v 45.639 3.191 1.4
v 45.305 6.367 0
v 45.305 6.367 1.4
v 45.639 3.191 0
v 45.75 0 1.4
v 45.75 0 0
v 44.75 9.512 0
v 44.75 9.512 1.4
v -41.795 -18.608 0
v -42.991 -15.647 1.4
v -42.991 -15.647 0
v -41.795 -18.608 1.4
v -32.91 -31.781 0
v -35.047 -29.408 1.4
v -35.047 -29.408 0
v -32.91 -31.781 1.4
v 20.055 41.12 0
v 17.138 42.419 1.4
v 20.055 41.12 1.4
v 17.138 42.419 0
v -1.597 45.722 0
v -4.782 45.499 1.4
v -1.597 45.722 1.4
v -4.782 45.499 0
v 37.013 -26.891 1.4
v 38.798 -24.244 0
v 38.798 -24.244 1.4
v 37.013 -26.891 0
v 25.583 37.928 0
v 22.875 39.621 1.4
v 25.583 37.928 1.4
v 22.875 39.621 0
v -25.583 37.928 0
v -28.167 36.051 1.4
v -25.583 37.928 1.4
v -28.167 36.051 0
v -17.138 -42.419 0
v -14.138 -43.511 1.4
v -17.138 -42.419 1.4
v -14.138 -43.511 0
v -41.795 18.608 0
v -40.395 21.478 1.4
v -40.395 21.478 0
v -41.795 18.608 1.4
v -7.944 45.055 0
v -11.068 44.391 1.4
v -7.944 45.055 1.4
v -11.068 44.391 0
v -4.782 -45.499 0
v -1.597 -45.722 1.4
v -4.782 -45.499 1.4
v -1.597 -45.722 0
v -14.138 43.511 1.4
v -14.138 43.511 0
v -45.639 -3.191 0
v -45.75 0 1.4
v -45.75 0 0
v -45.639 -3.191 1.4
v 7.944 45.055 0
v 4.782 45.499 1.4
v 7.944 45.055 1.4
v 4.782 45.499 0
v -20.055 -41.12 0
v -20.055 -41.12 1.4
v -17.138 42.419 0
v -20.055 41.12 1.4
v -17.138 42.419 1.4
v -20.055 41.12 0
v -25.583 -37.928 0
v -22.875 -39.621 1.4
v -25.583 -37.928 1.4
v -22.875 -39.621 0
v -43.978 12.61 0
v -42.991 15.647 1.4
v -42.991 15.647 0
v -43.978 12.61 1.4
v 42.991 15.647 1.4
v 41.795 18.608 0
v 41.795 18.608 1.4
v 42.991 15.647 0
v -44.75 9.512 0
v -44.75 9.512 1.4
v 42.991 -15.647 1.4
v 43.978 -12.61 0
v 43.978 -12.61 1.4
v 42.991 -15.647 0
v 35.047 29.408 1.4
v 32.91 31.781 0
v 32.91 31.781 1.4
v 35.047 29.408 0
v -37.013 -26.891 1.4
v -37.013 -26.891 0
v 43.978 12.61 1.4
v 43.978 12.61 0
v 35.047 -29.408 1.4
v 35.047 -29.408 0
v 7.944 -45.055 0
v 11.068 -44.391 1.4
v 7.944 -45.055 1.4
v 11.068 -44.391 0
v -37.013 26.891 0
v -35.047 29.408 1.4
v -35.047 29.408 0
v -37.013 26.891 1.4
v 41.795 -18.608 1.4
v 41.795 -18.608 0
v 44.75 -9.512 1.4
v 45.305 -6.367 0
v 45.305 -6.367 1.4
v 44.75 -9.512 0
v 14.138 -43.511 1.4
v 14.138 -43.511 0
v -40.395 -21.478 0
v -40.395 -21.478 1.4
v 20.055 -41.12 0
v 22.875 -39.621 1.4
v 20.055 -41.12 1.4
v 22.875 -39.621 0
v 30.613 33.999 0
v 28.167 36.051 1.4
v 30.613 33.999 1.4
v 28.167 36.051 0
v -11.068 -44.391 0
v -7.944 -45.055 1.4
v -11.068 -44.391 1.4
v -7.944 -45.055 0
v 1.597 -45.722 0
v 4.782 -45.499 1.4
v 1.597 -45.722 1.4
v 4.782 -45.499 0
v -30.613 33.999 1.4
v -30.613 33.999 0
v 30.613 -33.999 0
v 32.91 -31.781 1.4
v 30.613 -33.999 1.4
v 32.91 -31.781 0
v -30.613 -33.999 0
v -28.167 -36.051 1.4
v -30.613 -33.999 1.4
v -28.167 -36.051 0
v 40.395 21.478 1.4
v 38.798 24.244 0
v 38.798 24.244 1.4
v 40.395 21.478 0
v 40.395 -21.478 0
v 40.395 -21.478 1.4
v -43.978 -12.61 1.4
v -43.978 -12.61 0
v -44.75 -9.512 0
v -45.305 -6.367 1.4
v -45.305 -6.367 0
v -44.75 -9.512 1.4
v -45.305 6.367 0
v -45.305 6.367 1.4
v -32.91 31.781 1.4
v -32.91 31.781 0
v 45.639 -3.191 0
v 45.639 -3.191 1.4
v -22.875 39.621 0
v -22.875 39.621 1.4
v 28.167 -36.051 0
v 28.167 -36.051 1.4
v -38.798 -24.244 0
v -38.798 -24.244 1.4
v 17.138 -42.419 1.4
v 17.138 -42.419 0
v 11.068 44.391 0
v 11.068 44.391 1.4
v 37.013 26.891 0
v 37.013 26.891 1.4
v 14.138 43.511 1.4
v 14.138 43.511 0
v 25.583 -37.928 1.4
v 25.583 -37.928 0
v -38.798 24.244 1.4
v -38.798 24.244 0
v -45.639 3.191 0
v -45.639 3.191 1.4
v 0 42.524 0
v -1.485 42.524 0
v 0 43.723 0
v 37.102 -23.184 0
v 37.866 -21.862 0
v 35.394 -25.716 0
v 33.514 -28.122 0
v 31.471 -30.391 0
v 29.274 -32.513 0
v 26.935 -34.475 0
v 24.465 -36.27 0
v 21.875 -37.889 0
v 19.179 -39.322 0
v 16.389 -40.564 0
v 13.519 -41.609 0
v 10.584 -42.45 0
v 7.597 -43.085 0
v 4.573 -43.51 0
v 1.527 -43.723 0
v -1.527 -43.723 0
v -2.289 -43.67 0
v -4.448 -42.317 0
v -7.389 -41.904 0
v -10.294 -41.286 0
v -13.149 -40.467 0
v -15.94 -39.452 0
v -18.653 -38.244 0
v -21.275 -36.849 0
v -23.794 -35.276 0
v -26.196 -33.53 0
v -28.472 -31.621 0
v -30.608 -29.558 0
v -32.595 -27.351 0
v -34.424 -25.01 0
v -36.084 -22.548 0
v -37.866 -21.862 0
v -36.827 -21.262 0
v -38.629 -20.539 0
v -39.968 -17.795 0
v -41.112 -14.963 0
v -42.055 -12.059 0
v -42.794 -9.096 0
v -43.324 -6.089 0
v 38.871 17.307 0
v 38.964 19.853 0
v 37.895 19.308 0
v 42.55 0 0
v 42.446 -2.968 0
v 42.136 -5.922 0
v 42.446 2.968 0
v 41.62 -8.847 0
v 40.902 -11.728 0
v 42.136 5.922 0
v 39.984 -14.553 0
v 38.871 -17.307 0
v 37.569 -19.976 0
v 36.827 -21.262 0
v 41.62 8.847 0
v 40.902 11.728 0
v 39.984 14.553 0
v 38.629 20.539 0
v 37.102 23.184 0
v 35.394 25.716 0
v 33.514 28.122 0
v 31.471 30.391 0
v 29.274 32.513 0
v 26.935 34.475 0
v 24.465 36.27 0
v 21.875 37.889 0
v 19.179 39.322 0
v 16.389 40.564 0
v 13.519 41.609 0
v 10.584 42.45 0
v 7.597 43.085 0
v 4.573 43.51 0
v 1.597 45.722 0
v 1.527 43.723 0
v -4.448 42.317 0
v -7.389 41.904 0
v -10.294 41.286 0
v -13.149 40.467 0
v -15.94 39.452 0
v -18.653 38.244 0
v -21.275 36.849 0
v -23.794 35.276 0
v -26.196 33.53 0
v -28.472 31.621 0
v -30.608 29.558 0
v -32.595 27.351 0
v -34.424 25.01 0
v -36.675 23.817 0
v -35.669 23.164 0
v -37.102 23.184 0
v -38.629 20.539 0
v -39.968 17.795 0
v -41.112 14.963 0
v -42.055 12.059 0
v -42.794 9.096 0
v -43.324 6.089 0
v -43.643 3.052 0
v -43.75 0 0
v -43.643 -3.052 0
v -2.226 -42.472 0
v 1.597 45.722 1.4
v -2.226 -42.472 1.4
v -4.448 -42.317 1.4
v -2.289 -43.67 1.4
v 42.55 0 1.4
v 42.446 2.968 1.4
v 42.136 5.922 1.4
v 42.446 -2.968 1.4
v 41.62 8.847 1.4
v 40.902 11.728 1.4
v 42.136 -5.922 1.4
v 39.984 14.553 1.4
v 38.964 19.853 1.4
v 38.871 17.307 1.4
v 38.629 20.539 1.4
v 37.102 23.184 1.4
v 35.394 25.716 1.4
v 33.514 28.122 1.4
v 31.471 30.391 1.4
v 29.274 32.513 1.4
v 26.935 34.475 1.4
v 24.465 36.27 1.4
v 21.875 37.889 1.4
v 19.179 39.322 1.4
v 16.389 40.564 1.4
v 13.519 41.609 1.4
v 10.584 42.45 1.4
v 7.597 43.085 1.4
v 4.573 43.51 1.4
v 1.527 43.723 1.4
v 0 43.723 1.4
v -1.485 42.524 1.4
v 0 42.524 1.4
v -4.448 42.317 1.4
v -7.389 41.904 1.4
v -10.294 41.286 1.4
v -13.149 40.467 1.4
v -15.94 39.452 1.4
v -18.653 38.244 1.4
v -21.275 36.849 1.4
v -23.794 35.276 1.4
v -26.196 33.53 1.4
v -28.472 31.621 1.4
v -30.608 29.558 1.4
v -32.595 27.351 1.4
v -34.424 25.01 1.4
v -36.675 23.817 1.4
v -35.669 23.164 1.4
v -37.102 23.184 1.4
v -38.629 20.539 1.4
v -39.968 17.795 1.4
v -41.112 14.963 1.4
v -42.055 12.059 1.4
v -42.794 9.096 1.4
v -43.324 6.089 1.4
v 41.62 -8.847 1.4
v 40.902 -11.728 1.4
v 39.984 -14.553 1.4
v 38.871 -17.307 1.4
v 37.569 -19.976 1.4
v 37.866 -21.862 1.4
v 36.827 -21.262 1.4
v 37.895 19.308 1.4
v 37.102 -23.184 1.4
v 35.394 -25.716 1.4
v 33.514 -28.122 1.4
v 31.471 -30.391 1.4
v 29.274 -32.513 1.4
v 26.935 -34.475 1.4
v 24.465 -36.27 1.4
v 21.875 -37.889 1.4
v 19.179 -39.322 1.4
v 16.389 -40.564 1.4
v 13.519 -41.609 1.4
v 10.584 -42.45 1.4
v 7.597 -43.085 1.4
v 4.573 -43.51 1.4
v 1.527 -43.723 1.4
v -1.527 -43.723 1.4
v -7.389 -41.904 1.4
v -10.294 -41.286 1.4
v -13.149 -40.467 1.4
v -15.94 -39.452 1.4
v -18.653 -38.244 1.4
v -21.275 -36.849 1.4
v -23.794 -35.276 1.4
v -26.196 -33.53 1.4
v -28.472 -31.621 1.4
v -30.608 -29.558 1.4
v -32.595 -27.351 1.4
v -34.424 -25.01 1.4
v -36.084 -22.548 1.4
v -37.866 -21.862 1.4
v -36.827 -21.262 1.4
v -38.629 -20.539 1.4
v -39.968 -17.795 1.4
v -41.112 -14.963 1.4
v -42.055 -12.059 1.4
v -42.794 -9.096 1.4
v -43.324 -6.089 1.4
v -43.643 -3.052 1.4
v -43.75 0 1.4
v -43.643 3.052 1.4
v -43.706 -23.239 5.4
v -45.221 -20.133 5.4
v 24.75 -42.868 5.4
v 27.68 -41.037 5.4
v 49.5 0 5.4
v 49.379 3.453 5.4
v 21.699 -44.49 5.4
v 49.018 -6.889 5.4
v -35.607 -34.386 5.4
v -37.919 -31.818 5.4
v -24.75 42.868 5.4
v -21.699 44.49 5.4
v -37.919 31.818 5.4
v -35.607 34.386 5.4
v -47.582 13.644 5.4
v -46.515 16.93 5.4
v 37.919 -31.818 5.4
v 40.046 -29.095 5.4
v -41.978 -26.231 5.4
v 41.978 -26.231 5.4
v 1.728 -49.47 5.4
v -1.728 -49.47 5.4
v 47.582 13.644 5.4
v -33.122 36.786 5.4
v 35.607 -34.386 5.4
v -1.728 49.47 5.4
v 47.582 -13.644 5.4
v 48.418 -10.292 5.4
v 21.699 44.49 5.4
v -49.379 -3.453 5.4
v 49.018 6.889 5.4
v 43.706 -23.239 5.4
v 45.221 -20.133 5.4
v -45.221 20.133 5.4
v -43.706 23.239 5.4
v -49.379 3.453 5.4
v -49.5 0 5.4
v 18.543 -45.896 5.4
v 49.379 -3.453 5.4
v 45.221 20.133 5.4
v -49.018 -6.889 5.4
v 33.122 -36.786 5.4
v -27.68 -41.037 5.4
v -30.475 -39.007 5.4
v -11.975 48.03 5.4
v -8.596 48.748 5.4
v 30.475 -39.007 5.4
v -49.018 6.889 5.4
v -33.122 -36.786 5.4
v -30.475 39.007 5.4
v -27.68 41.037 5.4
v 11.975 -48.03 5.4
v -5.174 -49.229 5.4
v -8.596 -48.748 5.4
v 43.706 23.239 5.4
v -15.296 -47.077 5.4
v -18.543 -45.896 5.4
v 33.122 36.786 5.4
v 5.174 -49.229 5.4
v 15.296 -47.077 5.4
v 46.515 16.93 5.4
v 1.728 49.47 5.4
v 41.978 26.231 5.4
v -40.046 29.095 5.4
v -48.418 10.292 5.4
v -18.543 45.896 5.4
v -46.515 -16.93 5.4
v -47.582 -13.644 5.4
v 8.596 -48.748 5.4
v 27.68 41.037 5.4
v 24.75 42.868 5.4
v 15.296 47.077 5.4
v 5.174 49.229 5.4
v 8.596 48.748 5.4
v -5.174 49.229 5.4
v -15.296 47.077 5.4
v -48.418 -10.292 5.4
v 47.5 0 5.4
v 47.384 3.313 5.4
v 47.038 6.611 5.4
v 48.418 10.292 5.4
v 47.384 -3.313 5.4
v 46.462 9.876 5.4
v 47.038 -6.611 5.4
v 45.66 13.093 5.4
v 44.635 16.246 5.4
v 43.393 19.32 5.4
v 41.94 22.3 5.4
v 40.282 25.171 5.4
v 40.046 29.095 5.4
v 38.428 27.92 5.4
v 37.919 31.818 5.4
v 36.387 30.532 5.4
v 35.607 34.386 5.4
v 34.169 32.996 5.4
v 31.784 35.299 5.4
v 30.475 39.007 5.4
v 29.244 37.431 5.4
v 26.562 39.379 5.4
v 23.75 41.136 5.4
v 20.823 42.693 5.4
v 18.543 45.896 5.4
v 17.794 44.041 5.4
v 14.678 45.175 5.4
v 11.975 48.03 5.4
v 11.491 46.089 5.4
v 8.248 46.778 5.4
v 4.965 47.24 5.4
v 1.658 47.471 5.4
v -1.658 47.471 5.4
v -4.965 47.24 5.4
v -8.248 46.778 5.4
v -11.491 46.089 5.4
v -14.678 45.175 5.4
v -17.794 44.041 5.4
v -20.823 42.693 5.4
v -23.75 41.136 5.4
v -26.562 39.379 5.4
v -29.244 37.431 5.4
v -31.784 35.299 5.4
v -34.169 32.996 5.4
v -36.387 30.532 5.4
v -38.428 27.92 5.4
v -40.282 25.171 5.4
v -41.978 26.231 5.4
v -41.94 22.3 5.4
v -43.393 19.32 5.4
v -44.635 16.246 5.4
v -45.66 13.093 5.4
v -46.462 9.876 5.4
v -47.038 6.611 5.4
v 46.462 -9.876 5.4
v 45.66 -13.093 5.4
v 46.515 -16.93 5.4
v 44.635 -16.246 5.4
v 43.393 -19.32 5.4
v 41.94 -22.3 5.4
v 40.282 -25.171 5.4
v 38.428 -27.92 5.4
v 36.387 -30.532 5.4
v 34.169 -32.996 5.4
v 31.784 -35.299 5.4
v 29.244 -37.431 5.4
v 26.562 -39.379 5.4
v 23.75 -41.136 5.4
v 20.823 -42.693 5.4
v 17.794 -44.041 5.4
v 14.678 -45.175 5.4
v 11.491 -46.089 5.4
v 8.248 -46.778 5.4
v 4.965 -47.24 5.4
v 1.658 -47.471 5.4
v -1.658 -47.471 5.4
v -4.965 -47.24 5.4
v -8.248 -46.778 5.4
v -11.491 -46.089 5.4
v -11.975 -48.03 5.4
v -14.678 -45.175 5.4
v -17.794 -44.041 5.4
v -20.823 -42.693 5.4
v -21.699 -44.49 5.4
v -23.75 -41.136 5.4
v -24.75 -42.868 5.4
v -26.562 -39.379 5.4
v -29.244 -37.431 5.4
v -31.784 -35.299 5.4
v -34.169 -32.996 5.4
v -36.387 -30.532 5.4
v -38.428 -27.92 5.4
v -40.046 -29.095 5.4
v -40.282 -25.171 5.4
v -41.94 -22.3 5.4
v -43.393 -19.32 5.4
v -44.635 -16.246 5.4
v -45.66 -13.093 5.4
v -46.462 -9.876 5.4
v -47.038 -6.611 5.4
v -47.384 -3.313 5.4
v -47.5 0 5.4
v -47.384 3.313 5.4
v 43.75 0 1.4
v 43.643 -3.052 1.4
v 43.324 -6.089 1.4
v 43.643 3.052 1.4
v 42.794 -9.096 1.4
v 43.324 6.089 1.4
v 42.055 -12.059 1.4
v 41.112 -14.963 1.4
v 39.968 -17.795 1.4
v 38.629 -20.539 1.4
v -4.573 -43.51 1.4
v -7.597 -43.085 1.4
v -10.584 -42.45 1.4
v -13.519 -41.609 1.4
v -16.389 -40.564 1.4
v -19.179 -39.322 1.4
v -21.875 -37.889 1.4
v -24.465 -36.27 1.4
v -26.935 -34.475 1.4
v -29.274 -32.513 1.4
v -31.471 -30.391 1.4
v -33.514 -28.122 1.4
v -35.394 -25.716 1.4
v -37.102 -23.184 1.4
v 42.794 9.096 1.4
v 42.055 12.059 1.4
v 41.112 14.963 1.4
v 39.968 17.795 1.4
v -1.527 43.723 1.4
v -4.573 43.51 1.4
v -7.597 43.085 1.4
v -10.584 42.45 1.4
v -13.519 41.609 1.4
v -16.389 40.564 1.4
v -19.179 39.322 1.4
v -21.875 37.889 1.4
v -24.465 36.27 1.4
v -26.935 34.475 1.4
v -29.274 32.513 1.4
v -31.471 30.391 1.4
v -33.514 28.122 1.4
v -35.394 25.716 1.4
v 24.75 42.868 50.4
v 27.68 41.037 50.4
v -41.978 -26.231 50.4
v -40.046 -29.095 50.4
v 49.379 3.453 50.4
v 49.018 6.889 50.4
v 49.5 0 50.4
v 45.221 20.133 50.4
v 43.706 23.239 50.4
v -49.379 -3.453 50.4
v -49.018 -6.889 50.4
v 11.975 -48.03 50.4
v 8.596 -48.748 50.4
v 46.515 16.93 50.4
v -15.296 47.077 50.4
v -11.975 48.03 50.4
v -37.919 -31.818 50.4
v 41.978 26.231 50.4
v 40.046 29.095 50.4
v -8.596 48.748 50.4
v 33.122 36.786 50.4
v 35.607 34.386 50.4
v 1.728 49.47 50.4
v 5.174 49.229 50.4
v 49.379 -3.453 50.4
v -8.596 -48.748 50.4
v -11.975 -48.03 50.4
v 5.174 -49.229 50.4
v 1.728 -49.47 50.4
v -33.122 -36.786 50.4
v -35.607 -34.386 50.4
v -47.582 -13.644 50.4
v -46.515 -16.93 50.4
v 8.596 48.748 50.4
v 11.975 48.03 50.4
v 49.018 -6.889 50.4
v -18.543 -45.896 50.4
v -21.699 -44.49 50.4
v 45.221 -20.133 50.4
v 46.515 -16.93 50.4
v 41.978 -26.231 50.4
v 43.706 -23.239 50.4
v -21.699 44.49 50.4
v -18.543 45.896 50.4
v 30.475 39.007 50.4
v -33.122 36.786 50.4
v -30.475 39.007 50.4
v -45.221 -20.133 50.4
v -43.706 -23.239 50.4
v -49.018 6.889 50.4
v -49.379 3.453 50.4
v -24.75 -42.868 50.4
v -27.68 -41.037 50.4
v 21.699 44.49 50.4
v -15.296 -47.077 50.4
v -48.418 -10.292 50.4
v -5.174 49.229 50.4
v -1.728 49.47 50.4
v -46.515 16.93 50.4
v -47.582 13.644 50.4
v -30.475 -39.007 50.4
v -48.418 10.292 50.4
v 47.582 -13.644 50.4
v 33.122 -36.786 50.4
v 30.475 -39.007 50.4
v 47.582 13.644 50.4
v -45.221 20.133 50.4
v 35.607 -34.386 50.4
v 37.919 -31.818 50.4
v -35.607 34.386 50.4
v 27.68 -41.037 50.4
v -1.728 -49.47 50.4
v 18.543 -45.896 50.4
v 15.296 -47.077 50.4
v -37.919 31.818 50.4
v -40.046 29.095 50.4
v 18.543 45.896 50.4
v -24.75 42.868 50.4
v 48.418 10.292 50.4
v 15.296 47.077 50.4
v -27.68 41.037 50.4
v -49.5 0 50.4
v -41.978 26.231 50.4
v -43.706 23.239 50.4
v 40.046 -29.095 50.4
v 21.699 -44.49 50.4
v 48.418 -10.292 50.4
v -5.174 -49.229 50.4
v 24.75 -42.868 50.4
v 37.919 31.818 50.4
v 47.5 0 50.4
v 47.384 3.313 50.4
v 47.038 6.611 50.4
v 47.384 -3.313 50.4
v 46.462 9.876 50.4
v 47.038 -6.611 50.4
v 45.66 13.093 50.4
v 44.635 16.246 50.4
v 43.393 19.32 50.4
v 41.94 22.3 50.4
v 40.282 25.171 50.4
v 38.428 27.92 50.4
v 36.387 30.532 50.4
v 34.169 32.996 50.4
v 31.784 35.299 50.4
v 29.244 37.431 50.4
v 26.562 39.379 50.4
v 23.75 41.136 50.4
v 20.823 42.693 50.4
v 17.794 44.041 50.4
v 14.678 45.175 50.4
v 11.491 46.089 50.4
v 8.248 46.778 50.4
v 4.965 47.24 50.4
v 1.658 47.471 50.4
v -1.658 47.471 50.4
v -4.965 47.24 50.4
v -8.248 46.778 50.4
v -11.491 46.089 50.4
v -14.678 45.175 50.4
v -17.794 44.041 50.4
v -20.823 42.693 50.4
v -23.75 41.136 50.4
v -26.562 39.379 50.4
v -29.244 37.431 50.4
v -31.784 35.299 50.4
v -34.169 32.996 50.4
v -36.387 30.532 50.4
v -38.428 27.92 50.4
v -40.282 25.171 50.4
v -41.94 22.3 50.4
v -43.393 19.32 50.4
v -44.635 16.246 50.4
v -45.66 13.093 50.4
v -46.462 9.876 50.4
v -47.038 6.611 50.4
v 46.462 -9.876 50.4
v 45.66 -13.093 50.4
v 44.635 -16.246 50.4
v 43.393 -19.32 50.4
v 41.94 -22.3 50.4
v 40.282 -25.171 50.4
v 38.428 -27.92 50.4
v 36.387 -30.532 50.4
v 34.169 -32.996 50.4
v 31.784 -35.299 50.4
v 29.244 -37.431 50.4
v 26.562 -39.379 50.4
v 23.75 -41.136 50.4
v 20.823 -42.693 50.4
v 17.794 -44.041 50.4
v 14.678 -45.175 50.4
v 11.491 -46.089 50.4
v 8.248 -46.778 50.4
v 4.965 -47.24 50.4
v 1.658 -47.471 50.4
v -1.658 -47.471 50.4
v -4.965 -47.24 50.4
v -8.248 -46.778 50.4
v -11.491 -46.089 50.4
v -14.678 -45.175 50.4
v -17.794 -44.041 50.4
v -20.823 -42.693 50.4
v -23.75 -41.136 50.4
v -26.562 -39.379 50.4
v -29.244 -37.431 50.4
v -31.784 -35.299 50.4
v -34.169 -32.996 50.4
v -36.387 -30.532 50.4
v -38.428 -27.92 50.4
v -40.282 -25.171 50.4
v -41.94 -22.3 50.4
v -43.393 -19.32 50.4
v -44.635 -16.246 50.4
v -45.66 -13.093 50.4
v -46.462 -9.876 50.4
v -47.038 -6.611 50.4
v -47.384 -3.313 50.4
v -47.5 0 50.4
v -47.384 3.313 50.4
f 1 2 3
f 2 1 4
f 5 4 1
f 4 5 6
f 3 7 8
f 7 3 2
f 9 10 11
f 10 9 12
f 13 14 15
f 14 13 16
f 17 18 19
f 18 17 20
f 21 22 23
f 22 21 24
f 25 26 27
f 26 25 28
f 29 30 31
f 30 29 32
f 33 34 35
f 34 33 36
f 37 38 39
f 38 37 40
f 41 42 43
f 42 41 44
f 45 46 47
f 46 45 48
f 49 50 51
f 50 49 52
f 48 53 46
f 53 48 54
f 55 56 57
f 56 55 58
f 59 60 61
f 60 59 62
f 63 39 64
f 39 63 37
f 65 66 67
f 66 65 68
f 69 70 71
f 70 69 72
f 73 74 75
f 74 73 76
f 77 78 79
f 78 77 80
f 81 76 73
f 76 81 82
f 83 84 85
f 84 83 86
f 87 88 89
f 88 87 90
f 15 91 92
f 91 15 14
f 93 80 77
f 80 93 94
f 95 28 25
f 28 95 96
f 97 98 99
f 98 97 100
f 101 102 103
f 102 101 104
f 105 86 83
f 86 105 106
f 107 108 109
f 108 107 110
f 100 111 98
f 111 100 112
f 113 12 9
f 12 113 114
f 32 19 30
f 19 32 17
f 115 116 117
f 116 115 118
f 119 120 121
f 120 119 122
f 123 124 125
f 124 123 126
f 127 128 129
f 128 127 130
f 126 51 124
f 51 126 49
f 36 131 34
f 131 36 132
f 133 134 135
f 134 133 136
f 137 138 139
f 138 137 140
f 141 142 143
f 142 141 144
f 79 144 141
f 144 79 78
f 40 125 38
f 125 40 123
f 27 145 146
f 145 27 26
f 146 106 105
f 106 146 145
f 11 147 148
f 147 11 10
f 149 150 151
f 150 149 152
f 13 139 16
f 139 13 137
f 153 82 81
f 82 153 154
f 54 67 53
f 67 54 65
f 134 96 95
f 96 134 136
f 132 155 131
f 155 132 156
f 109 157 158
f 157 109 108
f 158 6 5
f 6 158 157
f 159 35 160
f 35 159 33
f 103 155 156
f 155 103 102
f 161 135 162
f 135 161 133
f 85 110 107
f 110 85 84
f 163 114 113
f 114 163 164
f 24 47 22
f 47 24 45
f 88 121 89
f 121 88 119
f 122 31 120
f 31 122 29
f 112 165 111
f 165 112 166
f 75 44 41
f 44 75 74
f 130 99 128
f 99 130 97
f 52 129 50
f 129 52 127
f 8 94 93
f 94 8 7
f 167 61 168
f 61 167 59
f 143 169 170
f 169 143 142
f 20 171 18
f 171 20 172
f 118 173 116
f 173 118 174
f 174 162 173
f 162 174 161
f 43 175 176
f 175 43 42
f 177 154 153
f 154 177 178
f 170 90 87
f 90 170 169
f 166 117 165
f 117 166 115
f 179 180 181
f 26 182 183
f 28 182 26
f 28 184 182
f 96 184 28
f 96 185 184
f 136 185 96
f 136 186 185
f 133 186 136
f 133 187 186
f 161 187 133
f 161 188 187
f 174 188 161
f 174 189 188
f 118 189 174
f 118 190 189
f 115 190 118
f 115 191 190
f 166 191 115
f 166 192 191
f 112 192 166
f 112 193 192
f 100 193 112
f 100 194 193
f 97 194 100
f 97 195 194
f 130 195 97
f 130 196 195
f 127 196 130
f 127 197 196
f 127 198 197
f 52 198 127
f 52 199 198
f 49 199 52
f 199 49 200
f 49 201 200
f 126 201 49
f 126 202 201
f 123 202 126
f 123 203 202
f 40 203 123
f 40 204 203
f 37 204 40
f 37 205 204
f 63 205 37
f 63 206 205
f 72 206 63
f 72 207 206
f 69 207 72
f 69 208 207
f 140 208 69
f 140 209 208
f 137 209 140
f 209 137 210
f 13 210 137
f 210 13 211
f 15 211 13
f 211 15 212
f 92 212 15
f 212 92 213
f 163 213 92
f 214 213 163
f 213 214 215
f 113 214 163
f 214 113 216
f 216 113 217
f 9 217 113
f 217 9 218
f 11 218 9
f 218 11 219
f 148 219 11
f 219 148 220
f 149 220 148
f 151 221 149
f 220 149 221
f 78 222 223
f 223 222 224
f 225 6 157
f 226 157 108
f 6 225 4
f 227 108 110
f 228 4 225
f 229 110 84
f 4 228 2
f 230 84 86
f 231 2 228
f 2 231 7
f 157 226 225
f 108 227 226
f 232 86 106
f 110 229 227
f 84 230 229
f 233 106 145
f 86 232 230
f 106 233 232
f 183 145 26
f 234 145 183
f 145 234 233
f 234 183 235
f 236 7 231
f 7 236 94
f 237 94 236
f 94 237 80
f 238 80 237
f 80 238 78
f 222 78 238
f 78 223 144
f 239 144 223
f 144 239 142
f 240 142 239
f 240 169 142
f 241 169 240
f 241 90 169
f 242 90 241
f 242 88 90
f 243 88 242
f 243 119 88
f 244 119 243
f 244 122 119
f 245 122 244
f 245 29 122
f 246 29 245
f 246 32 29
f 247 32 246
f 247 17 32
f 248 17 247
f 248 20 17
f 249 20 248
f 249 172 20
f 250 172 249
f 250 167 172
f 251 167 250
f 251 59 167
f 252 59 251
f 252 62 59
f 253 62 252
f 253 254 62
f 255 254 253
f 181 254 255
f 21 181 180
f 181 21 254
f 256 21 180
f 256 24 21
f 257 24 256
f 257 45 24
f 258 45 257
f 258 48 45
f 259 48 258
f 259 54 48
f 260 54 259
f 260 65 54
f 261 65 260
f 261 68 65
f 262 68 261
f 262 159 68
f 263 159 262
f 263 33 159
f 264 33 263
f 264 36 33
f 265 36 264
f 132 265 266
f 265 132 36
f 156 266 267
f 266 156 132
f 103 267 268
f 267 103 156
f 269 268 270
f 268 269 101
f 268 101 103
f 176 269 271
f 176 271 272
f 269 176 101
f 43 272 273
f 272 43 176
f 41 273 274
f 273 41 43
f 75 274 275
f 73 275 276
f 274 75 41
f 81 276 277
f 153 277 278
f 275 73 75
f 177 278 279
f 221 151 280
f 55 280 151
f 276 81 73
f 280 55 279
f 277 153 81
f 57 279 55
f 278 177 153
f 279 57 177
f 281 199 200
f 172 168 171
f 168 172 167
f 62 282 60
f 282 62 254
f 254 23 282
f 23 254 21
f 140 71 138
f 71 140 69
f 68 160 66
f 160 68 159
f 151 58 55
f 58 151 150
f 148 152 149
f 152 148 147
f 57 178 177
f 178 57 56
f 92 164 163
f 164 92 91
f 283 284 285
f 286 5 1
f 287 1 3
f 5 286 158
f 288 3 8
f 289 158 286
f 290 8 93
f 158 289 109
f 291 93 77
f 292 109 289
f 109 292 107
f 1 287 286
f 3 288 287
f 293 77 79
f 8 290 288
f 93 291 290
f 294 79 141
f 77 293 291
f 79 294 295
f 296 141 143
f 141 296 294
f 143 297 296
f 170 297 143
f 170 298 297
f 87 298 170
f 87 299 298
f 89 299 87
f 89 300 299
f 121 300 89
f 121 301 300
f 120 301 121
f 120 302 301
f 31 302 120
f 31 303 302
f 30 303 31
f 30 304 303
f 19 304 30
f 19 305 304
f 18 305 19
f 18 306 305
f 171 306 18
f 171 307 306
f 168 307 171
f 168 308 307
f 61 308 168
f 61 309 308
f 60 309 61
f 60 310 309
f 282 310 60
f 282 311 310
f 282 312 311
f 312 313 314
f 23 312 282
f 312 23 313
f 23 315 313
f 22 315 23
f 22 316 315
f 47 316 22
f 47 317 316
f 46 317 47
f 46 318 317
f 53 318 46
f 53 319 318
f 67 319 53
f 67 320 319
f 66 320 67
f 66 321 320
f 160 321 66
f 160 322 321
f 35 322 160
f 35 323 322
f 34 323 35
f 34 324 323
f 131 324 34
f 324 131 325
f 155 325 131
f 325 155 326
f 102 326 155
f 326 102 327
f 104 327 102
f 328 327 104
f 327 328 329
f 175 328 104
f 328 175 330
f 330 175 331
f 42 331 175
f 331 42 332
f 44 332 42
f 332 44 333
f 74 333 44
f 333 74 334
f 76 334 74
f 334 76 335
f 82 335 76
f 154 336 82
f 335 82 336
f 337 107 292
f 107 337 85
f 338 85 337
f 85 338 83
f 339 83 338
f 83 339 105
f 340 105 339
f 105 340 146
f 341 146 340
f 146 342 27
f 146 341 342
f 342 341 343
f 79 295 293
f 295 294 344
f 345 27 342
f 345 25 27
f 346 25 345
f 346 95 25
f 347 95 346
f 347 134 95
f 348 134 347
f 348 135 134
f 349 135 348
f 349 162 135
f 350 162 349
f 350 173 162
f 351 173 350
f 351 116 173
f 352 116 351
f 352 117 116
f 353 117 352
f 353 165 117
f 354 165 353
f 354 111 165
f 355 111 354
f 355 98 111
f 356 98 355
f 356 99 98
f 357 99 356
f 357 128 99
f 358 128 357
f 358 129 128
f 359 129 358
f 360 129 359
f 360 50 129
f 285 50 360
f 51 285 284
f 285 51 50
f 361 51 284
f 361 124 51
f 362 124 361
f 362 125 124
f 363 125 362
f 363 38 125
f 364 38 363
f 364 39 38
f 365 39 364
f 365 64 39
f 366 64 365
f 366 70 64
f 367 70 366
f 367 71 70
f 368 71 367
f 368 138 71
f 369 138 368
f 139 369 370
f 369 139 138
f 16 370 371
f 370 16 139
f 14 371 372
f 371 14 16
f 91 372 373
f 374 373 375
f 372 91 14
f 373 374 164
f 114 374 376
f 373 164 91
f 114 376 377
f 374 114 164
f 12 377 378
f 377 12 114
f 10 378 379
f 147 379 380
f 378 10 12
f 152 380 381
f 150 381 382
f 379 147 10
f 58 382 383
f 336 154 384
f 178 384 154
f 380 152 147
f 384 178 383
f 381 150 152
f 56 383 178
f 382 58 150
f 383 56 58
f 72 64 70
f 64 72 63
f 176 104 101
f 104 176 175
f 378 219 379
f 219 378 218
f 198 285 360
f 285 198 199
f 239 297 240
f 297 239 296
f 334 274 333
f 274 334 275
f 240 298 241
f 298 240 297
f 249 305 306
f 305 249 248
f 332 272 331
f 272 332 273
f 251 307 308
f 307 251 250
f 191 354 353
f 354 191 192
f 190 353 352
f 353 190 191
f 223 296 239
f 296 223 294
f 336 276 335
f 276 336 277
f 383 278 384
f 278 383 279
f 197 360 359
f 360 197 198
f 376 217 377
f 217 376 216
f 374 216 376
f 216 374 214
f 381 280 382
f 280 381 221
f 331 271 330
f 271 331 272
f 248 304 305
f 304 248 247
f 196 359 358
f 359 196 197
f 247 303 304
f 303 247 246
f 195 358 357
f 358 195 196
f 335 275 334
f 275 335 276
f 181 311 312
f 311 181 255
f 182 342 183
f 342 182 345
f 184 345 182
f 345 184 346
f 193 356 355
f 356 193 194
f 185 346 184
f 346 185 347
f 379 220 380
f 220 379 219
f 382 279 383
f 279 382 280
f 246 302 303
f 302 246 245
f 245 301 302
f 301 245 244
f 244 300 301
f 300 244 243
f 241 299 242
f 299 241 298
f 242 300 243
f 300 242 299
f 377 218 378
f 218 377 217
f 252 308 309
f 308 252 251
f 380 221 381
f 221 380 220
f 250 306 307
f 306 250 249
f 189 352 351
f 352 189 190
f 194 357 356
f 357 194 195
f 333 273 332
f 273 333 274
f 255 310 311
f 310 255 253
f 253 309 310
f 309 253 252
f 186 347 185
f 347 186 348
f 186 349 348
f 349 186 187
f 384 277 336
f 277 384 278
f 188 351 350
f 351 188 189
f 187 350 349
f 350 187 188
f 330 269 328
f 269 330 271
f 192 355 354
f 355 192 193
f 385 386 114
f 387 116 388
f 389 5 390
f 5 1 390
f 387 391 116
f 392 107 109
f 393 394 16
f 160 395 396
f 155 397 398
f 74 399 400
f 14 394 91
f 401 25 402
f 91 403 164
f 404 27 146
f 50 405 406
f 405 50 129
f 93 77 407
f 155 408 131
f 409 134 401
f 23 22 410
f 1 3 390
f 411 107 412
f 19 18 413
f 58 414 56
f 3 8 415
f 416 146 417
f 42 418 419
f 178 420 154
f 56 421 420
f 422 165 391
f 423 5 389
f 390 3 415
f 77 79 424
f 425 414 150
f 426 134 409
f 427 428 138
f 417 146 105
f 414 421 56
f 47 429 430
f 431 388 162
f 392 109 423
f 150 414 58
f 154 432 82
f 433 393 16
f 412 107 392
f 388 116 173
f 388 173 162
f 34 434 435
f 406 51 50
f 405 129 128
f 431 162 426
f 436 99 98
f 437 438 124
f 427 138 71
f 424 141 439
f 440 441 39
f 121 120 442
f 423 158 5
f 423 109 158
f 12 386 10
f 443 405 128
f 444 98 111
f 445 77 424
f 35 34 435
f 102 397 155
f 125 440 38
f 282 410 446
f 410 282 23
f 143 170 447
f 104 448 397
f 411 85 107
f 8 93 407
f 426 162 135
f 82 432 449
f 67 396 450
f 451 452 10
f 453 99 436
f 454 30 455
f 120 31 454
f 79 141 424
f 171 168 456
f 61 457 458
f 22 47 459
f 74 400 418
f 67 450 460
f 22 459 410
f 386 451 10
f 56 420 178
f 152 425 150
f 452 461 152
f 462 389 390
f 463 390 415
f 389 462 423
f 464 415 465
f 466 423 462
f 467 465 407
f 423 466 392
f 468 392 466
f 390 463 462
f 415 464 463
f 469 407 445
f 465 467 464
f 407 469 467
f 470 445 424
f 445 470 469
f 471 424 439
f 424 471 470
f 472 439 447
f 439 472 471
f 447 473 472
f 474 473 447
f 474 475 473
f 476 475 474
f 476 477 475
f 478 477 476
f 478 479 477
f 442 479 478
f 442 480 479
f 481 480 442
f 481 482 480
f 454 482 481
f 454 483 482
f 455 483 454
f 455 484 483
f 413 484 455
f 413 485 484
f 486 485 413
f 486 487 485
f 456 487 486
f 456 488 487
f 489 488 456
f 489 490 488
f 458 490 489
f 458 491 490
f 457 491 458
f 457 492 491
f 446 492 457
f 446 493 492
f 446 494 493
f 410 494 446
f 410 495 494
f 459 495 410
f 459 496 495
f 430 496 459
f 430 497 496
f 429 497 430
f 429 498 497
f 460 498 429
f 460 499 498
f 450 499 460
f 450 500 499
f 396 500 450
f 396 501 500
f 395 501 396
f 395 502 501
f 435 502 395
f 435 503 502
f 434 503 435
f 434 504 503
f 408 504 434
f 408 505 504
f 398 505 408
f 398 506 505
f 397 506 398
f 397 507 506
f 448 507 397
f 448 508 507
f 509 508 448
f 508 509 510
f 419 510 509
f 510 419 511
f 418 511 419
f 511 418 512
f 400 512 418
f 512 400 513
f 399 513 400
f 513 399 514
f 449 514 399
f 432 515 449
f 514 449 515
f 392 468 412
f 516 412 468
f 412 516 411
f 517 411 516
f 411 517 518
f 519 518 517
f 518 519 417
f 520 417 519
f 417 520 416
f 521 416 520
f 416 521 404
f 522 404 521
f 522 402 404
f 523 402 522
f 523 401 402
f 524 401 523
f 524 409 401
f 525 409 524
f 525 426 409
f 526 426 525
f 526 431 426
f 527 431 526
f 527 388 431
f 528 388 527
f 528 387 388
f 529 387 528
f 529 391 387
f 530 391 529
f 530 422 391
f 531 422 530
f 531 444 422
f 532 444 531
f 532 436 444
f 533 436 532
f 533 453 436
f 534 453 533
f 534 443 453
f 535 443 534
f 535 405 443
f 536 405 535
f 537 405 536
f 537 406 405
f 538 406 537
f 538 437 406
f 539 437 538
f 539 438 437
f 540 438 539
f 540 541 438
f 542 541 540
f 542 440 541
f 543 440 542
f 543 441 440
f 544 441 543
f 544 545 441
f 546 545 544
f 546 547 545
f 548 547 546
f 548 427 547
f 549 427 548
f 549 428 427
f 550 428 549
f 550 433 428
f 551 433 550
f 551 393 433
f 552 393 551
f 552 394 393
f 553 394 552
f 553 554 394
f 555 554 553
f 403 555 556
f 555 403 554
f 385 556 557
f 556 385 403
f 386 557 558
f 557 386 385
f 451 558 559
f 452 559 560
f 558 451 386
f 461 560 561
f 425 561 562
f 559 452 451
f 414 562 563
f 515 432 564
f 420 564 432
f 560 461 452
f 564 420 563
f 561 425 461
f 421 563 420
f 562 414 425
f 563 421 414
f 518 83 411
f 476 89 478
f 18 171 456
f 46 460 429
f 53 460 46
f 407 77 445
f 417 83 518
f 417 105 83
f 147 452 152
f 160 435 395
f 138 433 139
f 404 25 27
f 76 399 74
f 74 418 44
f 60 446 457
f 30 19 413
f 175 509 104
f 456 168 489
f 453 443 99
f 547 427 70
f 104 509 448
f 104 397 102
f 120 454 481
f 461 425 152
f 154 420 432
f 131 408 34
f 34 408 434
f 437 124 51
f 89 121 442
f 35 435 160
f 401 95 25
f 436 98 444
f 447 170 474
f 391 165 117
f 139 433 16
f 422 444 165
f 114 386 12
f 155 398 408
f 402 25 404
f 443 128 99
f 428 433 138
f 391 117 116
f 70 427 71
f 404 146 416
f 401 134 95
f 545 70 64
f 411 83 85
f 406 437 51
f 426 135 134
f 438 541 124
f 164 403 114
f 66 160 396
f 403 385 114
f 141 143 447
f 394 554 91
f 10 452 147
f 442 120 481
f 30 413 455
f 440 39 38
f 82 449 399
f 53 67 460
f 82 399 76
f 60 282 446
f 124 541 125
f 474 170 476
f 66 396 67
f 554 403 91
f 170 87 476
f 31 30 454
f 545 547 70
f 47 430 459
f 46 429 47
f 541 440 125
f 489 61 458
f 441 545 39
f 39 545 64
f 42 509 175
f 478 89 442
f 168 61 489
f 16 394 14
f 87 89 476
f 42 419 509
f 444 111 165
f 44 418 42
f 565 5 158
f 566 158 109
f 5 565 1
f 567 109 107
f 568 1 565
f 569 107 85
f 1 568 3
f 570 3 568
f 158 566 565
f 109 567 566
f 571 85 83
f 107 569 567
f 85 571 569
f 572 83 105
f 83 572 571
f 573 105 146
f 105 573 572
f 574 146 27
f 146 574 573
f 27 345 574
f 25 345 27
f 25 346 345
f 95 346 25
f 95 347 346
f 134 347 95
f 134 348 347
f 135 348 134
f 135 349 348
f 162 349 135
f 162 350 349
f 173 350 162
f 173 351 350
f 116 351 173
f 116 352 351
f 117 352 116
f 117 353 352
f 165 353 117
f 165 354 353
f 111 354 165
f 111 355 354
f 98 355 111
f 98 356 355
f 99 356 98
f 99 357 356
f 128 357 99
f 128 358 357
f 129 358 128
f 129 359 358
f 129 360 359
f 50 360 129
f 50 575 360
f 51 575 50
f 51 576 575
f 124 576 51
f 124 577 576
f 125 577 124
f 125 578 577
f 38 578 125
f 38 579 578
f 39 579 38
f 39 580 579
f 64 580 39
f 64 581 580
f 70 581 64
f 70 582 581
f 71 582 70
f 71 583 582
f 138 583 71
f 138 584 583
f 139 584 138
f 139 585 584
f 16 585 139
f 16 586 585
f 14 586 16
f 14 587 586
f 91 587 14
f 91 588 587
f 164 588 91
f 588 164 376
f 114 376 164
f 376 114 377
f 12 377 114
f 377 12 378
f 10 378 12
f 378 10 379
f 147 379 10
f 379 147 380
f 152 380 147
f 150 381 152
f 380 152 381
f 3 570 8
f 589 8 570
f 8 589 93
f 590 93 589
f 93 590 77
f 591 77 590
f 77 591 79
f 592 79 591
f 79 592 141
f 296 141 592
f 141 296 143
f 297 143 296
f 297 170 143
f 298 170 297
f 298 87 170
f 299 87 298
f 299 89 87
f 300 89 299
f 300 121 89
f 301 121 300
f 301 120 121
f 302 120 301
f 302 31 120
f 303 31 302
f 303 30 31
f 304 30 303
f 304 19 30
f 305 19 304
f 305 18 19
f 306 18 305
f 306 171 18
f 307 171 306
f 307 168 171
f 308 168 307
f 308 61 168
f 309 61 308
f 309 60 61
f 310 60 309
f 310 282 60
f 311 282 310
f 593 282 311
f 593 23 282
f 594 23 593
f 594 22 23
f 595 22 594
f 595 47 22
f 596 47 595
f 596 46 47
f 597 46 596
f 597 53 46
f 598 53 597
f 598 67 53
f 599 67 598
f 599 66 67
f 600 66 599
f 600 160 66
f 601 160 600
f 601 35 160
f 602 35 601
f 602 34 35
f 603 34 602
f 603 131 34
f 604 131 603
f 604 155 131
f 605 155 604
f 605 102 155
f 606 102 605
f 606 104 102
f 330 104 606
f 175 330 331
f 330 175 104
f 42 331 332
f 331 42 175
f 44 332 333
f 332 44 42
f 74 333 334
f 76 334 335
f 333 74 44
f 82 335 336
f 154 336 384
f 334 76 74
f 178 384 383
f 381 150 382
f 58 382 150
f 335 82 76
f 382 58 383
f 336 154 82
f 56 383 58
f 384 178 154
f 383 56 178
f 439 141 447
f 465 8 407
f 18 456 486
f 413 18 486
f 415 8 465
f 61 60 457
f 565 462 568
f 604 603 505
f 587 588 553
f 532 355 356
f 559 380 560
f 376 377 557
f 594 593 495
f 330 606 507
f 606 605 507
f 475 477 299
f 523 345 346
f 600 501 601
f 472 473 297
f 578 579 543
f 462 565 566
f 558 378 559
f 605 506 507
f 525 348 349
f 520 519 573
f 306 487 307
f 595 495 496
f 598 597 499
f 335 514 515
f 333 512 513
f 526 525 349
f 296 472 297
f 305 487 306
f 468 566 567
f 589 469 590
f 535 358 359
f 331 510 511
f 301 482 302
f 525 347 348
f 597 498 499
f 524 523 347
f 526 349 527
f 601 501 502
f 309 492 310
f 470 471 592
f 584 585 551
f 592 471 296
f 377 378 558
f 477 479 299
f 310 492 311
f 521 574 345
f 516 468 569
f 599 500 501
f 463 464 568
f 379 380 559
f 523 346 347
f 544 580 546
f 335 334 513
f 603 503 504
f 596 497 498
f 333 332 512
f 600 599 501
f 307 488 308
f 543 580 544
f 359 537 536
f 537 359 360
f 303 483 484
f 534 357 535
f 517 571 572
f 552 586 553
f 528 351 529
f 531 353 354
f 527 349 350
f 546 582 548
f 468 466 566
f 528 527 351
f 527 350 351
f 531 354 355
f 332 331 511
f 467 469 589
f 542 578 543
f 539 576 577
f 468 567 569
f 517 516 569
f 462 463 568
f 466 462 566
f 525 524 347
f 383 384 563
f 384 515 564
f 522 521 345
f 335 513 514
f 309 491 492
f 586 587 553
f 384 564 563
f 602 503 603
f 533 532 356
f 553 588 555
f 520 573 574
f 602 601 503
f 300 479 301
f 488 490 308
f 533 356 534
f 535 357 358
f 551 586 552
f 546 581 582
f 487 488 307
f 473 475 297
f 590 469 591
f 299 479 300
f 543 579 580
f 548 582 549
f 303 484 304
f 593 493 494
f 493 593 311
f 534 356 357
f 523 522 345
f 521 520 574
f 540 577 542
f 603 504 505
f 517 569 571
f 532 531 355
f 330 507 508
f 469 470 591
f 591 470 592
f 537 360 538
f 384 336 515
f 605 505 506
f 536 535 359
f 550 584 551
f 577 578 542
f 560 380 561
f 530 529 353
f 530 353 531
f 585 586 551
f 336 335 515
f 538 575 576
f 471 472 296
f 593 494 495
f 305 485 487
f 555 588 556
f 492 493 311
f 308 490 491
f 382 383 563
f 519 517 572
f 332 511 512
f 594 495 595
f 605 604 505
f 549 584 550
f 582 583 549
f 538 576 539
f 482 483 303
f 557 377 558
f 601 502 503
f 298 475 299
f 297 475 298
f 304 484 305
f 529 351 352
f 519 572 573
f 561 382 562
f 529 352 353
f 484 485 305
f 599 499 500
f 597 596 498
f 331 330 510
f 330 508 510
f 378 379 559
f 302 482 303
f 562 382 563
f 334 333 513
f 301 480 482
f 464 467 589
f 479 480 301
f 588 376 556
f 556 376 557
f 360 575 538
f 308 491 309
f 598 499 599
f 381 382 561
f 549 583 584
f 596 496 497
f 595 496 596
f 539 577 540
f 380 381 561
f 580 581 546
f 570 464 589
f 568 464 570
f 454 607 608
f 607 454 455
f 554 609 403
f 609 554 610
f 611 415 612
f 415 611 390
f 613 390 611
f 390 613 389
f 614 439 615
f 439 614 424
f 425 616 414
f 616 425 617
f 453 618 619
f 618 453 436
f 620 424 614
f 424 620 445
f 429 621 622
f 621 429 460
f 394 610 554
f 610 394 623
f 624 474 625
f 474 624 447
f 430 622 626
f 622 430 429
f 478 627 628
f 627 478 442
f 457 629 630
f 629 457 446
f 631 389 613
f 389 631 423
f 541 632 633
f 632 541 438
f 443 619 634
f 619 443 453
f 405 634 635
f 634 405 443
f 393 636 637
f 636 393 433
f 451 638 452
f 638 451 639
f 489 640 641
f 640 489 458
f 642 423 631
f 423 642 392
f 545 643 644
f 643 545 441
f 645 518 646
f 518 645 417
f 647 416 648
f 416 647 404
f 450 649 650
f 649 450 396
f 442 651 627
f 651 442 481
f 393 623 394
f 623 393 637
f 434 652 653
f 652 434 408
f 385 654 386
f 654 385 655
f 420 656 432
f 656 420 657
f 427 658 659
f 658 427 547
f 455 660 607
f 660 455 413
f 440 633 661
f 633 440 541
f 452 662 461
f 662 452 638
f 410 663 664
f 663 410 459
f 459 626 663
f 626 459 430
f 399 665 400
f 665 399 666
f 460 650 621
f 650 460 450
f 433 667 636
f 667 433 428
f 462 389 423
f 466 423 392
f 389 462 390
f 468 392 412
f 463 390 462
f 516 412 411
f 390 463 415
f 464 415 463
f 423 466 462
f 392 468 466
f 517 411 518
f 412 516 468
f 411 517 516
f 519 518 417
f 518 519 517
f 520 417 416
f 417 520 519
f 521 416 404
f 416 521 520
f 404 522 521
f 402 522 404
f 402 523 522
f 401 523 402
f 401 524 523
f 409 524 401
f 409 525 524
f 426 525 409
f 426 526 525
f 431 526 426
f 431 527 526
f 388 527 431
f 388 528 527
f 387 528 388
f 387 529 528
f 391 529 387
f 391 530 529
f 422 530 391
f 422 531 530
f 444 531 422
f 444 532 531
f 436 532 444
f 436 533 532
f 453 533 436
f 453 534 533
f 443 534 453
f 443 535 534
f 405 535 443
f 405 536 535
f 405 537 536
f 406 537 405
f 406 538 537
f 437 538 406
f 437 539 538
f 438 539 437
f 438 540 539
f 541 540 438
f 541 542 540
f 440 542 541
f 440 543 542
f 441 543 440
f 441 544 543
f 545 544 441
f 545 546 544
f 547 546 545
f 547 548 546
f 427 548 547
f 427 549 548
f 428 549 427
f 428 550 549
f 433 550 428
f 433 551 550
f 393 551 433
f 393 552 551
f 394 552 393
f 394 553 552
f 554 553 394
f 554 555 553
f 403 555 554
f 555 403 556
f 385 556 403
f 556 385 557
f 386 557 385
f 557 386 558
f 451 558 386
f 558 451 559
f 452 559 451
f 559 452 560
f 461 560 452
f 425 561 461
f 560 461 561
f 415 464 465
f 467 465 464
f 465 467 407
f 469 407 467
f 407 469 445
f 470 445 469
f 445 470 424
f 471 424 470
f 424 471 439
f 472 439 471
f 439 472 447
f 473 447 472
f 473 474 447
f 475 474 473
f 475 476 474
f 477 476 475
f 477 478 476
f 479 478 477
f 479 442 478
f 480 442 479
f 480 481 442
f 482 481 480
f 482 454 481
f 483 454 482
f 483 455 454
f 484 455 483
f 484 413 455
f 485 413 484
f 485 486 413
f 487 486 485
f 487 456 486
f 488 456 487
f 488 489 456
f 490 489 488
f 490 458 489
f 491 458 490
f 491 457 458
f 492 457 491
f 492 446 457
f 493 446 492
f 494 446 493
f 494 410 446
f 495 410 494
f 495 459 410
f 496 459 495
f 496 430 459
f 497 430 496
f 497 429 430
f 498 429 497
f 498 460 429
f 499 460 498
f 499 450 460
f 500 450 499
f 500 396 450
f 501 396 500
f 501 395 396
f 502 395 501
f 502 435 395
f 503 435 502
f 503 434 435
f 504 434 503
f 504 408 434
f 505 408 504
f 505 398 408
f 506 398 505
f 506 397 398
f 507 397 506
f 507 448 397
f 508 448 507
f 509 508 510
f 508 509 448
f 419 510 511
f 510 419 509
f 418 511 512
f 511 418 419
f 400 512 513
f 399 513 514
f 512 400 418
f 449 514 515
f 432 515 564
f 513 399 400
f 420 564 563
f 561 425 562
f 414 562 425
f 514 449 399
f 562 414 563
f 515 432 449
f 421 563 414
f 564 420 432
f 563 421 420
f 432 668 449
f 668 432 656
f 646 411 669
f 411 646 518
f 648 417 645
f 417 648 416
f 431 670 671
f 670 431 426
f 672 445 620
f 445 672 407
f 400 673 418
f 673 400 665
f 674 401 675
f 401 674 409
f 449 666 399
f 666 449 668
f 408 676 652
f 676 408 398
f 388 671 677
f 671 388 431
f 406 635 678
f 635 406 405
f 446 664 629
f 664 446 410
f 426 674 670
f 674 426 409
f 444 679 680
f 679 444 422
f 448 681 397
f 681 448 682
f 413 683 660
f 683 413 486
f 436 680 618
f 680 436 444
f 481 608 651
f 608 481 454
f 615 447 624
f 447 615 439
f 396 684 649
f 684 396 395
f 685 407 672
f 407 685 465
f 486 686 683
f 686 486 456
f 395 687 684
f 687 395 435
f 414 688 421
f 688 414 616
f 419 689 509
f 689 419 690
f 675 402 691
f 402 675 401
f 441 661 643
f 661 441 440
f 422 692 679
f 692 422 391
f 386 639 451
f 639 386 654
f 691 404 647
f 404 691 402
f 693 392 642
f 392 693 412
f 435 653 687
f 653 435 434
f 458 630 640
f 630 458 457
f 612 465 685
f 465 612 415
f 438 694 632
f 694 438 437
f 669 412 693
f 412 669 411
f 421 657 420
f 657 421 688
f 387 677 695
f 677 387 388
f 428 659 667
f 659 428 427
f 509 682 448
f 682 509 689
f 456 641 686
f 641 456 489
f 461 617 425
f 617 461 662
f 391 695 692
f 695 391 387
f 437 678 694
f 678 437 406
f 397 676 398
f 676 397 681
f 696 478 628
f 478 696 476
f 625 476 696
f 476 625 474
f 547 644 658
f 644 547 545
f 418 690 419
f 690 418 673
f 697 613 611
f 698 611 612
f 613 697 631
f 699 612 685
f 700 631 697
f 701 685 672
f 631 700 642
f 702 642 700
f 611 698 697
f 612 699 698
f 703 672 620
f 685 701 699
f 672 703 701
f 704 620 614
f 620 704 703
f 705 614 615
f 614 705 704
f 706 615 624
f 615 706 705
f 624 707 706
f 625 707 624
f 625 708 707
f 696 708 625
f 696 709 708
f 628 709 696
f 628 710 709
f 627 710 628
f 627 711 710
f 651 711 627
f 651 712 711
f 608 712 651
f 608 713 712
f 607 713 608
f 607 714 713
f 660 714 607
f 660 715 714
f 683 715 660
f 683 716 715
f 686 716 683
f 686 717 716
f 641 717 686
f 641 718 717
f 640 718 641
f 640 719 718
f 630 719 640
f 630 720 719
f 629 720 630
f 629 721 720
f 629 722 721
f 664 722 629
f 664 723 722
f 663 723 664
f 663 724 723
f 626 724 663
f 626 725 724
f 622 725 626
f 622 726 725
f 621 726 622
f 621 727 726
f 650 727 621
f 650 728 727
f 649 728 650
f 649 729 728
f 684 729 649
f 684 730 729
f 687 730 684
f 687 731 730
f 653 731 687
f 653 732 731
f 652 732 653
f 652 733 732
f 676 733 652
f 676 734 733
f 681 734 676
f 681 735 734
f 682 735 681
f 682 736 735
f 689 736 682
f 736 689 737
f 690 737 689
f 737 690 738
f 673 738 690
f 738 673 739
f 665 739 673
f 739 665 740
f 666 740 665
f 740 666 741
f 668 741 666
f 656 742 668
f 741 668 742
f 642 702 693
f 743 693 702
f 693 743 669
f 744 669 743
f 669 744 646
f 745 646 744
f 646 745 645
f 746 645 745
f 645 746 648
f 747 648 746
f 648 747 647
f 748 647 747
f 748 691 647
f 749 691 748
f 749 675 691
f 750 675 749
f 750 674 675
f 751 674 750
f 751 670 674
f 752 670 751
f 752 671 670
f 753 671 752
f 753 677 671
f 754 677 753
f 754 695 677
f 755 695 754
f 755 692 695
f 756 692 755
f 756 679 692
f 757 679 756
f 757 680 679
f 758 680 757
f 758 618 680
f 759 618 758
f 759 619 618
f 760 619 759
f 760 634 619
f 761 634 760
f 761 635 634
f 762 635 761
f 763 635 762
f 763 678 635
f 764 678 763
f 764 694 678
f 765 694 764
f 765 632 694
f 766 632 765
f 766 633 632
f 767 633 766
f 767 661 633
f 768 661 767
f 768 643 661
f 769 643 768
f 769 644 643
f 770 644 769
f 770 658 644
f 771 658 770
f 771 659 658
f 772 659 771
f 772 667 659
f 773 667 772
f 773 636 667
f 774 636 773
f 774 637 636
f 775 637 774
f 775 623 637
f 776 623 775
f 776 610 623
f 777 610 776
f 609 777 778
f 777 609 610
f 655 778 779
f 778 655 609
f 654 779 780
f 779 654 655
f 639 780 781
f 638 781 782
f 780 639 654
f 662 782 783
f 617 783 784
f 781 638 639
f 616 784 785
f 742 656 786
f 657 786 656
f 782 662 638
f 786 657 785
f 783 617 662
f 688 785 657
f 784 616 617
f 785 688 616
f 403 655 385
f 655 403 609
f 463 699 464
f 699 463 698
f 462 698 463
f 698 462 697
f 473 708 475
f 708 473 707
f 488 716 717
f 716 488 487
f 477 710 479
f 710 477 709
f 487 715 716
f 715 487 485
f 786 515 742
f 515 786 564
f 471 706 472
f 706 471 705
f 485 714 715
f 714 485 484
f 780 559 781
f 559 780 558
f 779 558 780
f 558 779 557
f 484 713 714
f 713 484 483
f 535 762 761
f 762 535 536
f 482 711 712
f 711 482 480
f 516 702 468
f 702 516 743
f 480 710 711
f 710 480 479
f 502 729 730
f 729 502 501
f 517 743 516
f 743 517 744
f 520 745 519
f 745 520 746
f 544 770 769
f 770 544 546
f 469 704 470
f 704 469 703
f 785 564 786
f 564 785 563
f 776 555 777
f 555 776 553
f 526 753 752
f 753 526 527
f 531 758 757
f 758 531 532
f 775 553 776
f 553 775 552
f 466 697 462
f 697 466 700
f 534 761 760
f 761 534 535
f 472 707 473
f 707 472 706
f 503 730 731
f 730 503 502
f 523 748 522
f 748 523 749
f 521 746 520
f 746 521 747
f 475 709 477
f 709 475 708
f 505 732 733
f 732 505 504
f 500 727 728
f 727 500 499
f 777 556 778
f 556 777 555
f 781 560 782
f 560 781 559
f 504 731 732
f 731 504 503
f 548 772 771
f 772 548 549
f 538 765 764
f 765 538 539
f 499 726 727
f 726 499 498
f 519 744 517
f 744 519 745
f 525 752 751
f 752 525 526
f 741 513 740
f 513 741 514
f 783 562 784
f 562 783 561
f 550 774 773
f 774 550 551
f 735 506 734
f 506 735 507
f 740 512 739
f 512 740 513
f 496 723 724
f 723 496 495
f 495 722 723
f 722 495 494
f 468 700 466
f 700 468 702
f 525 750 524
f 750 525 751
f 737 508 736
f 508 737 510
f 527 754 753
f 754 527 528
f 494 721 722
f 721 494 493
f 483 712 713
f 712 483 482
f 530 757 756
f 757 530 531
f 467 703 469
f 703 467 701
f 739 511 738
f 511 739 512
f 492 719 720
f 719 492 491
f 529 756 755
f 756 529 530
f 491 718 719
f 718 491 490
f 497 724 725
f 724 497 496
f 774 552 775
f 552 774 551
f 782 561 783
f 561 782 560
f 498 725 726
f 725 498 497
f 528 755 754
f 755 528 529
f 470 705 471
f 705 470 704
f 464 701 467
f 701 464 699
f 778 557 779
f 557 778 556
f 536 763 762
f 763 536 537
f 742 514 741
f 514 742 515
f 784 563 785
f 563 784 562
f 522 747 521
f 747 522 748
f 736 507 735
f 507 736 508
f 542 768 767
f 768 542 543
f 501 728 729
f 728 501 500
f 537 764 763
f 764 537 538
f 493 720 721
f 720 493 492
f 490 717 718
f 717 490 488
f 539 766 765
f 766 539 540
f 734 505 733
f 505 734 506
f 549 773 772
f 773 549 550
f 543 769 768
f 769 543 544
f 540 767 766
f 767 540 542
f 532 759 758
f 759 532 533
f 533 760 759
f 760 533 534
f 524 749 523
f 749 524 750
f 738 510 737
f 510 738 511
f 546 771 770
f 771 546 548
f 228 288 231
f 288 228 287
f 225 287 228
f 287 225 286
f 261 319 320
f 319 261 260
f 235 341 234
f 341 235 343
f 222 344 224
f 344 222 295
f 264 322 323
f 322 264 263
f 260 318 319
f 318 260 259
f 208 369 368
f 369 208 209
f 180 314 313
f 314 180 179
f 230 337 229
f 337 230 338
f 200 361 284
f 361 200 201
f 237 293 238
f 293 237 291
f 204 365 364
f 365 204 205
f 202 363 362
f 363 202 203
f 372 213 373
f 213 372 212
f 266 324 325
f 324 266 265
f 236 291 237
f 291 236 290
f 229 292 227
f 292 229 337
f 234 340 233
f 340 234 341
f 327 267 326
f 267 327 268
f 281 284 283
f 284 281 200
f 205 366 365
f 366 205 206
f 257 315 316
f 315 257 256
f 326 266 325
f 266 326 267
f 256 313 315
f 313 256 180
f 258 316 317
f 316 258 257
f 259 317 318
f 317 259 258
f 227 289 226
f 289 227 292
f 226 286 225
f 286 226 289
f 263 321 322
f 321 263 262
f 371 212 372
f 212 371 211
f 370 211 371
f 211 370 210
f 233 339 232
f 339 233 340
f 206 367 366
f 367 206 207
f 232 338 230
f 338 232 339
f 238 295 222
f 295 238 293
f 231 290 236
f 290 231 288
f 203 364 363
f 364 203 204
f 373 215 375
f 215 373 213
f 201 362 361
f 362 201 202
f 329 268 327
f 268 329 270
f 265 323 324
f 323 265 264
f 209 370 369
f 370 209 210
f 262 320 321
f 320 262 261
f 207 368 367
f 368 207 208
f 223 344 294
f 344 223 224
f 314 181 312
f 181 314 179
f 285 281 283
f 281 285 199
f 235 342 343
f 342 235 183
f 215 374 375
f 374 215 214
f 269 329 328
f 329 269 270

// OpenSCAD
// customized to replace an HB-7 for 80-200 f/2.8 AF-D lens

// Originally: https://www.thingiverse.com/thing:868776
//Parameterised olympus bayonet lens hood generator
// Glyn Cowles Feb 2014


//Thickness of tube walls
thickness=2.0;
//Inside diameter of bottom tube
d1_inside=87.5;
//Height of bottom tube
h1=1.4;
//Inside diameter of top tube
d2_inside=95;
//Height of top tube
h2=45;
//Height of connector section
c_ht=4;
// Percentage of circumference for one flange
f_pcent=16;
// Flange thickness
f_th=1.2;
//Flange height
f_ht=1.4;
// Resolution
$fn=90;

d1=d1_inside+2*thickness;
d2=d2_inside+2*thickness;
mask_degree=ceil(120-(f_pcent/100*360)); // this is the angle of the pie_slice mask
assemble();
//-----------------------------------------------------------------------
module tube(d,h,t) { // diameter height thickness
rad=d/2;
difference() {
cylinder(h=h,r=rad);
cylinder(h=h,r=rad-t);
}
}
//-----------------------------------------------------------------------

module connector(){
difference() {
 cylinder (h=c_ht,r1=d1/2,r2=d2/2);
 cylinder (h=c_ht,r1=d1/2-thickness,r2=d2/2-thickness);
}
}
//-----------------------------------------------------------------------

module flange() { // the three connecting lugs at the base
  difference() {
  tube(d1-thickness*2,f_ht,f_th);
  union () {
        pie_slice(0,mask_degree,d1,f_ht)  ; //65 deg is the amount to remove
        pie_slice(120,mask_degree,d1,f_ht)  ;
        pie_slice(240,mask_degree,d1,f_ht)  ;
    }
  }
}
//-----------------------------------------------------------------------

module pie_slice(a,b,rad,h) { // make a pie slice starting at angle a continuing for angle b with radius of rad and height of h
    x1=sin(a)*rad;
    y1=cos(a)*rad;
    x2=sin(a+b)*rad;
    y2=cos(a+b)*rad;
    linear_extrude(height=h)
    polygon(
        points=[ [0,0],[x1,y1],[x2,y2]]
    );
}
//-----------------------------------------------------------------------

module assemble() {
union() {
    tube(d1,h1,thickness); //bottom tube
    translate([0,0,h1]) connector();  // connector
    translate([0,0,h1+c_ht])  tube(d2,h2,thickness); // top tube
    translate([0,0,0]) flange(); //connecting lugs
    }
};
